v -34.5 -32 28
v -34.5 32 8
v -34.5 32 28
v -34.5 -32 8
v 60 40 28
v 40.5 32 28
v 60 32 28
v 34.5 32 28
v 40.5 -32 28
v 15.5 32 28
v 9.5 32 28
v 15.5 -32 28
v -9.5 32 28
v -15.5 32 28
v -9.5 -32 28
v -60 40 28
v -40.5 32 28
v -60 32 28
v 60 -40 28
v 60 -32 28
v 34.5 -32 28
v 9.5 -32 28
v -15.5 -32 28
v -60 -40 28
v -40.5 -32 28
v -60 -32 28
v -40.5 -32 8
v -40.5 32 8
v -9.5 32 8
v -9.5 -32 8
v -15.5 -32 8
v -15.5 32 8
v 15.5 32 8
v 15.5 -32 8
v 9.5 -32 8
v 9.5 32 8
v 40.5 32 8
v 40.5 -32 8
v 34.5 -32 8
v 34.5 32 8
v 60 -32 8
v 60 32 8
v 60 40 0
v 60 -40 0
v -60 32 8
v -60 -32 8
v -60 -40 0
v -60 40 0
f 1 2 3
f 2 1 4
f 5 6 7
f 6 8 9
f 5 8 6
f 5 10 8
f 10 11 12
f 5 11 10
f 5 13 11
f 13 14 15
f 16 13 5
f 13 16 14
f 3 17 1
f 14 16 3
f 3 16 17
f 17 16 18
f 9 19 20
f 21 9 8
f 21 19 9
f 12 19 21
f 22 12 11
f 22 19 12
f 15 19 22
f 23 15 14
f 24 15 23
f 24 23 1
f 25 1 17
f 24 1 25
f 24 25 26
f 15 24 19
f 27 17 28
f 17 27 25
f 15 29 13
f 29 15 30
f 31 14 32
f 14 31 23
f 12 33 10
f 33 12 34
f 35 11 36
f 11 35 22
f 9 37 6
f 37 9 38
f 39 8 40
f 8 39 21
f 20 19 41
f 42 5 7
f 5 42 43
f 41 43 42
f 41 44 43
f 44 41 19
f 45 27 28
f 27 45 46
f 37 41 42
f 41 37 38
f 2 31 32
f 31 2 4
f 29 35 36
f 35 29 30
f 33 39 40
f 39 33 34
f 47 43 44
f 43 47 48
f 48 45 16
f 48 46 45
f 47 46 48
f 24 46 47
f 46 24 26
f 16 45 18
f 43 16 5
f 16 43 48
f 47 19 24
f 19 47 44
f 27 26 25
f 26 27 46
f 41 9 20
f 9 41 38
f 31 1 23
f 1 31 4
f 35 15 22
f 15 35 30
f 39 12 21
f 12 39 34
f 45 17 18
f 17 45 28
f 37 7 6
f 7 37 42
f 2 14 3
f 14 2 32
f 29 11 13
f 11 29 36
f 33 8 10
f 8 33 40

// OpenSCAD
$fn = 32;

// ----------------------------------------------------------------------
// Rib frame 120 x 80 x 28
// 4 ribs at 25 mm pitch
// ----------------------------------------------------------------------

// --- parameters (mm) ---
frame = [120, 80, 8];  // base plate size (x, y, z)
rail_w = 8;            // side rail width
ribs = 4;              // number of ribs
rib_t = 6;             // rib thickness
rib_h = 20;            // rib height above the base plate
pitch = 25;            // pitch between rib centres

// --- derived feature positions (mm) ---
span = (ribs - 1) * pitch;          // = 75   distance between the outer ribs
origin_x = -span / 2;               // = -37.5   X of the first rib
rib_len = frame[1] - 2 * rail_w + 2;  // = 66   rib length, 1 mm into each rail
feature_centers = [
  [origin_x + 0 * pitch, 0],
  [origin_x + 1 * pitch, 0],
  [origin_x + 2 * pitch, 0],
  [origin_x + 3 * pitch, 0]
];   // rib centre line, drives the rib loop

// base plate, two side rails, then the ribs read straight off feature_centers
union() {
  translate([-frame[0] / 2, -frame[1] / 2, 0]) cube(frame);
  translate([-frame[0] / 2, -frame[1] / 2, 0]) cube([frame[0], rail_w, frame[2] + rib_h]);
  translate([-frame[0] / 2, frame[1] / 2 - rail_w, 0]) cube([frame[0], rail_w, frame[2] + rib_h]);
  for (centre = feature_centers)
    translate([centre[0] - rib_t / 2, centre[1] - rib_len / 2, frame[2] - 1])
      cube([rib_t, rib_len, rib_h + 1]);
}
